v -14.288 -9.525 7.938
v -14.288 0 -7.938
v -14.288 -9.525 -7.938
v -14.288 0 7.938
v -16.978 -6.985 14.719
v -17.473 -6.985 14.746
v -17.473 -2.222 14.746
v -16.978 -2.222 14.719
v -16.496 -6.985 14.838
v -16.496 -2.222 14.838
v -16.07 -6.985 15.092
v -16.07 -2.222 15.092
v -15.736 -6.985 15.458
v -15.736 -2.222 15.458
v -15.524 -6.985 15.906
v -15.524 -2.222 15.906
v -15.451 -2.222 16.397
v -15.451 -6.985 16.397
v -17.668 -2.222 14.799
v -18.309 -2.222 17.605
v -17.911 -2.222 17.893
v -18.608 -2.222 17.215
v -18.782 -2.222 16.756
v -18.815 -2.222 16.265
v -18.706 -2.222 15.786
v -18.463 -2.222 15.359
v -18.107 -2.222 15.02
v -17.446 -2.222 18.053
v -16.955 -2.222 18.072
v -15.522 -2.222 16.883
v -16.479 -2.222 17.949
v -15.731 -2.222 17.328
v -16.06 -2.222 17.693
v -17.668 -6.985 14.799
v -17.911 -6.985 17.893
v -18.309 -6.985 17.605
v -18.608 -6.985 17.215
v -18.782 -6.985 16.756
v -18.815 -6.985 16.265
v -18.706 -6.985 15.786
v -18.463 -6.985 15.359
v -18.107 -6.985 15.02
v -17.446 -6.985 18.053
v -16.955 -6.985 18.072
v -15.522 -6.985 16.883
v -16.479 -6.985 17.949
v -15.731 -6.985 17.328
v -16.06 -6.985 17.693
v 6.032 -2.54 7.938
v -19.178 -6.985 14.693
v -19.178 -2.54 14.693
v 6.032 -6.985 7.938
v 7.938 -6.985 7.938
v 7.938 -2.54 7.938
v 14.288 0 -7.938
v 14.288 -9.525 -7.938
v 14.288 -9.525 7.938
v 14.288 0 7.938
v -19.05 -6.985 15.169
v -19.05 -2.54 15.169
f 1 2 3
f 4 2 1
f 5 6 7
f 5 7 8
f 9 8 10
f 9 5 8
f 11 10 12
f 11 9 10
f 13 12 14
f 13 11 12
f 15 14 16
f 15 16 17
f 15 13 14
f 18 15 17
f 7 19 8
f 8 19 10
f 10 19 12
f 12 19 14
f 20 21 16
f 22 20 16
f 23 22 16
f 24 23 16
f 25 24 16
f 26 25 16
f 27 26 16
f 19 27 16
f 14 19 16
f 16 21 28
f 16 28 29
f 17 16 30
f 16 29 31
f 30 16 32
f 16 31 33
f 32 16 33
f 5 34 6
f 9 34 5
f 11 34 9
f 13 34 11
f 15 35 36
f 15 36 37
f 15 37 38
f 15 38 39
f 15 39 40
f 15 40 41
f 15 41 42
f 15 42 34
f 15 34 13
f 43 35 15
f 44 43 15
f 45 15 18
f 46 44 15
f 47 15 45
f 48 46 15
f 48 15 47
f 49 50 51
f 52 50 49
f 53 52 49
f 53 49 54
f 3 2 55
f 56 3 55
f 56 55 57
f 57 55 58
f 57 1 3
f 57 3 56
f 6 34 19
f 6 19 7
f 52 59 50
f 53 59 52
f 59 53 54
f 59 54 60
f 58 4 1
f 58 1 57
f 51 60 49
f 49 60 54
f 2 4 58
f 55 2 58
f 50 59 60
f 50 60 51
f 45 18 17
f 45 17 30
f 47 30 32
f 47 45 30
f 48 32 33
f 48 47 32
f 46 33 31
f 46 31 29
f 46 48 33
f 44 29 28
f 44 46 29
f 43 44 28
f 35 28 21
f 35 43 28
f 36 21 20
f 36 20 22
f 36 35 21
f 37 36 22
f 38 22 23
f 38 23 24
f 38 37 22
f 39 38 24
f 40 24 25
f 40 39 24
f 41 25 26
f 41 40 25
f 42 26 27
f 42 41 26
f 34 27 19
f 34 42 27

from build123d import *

# Parameters (mm, degrees)
F0_W     = 28.575
F0_H     = 15.875
F1_DEPTH = 9.525
F3_START = -2.54
F3_DEPTH = 4.445
F5_DEPTH = 4.7625


with BuildPart() as f1:
    # F0 (on Front) → F1 (new body)
    with BuildSketch(Plane.XZ):
        Rectangle(F0_W, F0_H)
    extrude(amount=F1_DEPTH)


with BuildPart() as f3:
    # F2 (on face) → F3 (new body)
    with BuildSketch(Plane.XZ.offset(9.525).offset(F3_START)):
        Polygon((-19.1780783894, 14.6926541202), (6.0325, 7.9375), (7.9375, 7.9375), (-19.0504675865, 15.1689041202), align=None)
    extrude(amount=-F3_DEPTH)


with BuildPart() as f5:
    # F4 (on face) → F5 (new body)
    with BuildSketch(Plane.XZ.offset(6.985)):
        with BuildLine():
            ThreePointArc((-17.4731130829, 14.7462532547), (-16.0701477194, 15.0916210747), (-15.4506250494, 16.3969112355))
            ThreePointArc((-15.4506250494, 16.3969112355), (-18.1205526718, 17.7637608334), (-17.6683786385, 14.7985745027))
            Line((-17.6683786385, 14.7985745027), (-17.4731130829, 14.7462532547))
        make_face()
    extrude(amount=-F5_DEPTH)


solid = Compound([f1.part, f3.part, f5.part])
